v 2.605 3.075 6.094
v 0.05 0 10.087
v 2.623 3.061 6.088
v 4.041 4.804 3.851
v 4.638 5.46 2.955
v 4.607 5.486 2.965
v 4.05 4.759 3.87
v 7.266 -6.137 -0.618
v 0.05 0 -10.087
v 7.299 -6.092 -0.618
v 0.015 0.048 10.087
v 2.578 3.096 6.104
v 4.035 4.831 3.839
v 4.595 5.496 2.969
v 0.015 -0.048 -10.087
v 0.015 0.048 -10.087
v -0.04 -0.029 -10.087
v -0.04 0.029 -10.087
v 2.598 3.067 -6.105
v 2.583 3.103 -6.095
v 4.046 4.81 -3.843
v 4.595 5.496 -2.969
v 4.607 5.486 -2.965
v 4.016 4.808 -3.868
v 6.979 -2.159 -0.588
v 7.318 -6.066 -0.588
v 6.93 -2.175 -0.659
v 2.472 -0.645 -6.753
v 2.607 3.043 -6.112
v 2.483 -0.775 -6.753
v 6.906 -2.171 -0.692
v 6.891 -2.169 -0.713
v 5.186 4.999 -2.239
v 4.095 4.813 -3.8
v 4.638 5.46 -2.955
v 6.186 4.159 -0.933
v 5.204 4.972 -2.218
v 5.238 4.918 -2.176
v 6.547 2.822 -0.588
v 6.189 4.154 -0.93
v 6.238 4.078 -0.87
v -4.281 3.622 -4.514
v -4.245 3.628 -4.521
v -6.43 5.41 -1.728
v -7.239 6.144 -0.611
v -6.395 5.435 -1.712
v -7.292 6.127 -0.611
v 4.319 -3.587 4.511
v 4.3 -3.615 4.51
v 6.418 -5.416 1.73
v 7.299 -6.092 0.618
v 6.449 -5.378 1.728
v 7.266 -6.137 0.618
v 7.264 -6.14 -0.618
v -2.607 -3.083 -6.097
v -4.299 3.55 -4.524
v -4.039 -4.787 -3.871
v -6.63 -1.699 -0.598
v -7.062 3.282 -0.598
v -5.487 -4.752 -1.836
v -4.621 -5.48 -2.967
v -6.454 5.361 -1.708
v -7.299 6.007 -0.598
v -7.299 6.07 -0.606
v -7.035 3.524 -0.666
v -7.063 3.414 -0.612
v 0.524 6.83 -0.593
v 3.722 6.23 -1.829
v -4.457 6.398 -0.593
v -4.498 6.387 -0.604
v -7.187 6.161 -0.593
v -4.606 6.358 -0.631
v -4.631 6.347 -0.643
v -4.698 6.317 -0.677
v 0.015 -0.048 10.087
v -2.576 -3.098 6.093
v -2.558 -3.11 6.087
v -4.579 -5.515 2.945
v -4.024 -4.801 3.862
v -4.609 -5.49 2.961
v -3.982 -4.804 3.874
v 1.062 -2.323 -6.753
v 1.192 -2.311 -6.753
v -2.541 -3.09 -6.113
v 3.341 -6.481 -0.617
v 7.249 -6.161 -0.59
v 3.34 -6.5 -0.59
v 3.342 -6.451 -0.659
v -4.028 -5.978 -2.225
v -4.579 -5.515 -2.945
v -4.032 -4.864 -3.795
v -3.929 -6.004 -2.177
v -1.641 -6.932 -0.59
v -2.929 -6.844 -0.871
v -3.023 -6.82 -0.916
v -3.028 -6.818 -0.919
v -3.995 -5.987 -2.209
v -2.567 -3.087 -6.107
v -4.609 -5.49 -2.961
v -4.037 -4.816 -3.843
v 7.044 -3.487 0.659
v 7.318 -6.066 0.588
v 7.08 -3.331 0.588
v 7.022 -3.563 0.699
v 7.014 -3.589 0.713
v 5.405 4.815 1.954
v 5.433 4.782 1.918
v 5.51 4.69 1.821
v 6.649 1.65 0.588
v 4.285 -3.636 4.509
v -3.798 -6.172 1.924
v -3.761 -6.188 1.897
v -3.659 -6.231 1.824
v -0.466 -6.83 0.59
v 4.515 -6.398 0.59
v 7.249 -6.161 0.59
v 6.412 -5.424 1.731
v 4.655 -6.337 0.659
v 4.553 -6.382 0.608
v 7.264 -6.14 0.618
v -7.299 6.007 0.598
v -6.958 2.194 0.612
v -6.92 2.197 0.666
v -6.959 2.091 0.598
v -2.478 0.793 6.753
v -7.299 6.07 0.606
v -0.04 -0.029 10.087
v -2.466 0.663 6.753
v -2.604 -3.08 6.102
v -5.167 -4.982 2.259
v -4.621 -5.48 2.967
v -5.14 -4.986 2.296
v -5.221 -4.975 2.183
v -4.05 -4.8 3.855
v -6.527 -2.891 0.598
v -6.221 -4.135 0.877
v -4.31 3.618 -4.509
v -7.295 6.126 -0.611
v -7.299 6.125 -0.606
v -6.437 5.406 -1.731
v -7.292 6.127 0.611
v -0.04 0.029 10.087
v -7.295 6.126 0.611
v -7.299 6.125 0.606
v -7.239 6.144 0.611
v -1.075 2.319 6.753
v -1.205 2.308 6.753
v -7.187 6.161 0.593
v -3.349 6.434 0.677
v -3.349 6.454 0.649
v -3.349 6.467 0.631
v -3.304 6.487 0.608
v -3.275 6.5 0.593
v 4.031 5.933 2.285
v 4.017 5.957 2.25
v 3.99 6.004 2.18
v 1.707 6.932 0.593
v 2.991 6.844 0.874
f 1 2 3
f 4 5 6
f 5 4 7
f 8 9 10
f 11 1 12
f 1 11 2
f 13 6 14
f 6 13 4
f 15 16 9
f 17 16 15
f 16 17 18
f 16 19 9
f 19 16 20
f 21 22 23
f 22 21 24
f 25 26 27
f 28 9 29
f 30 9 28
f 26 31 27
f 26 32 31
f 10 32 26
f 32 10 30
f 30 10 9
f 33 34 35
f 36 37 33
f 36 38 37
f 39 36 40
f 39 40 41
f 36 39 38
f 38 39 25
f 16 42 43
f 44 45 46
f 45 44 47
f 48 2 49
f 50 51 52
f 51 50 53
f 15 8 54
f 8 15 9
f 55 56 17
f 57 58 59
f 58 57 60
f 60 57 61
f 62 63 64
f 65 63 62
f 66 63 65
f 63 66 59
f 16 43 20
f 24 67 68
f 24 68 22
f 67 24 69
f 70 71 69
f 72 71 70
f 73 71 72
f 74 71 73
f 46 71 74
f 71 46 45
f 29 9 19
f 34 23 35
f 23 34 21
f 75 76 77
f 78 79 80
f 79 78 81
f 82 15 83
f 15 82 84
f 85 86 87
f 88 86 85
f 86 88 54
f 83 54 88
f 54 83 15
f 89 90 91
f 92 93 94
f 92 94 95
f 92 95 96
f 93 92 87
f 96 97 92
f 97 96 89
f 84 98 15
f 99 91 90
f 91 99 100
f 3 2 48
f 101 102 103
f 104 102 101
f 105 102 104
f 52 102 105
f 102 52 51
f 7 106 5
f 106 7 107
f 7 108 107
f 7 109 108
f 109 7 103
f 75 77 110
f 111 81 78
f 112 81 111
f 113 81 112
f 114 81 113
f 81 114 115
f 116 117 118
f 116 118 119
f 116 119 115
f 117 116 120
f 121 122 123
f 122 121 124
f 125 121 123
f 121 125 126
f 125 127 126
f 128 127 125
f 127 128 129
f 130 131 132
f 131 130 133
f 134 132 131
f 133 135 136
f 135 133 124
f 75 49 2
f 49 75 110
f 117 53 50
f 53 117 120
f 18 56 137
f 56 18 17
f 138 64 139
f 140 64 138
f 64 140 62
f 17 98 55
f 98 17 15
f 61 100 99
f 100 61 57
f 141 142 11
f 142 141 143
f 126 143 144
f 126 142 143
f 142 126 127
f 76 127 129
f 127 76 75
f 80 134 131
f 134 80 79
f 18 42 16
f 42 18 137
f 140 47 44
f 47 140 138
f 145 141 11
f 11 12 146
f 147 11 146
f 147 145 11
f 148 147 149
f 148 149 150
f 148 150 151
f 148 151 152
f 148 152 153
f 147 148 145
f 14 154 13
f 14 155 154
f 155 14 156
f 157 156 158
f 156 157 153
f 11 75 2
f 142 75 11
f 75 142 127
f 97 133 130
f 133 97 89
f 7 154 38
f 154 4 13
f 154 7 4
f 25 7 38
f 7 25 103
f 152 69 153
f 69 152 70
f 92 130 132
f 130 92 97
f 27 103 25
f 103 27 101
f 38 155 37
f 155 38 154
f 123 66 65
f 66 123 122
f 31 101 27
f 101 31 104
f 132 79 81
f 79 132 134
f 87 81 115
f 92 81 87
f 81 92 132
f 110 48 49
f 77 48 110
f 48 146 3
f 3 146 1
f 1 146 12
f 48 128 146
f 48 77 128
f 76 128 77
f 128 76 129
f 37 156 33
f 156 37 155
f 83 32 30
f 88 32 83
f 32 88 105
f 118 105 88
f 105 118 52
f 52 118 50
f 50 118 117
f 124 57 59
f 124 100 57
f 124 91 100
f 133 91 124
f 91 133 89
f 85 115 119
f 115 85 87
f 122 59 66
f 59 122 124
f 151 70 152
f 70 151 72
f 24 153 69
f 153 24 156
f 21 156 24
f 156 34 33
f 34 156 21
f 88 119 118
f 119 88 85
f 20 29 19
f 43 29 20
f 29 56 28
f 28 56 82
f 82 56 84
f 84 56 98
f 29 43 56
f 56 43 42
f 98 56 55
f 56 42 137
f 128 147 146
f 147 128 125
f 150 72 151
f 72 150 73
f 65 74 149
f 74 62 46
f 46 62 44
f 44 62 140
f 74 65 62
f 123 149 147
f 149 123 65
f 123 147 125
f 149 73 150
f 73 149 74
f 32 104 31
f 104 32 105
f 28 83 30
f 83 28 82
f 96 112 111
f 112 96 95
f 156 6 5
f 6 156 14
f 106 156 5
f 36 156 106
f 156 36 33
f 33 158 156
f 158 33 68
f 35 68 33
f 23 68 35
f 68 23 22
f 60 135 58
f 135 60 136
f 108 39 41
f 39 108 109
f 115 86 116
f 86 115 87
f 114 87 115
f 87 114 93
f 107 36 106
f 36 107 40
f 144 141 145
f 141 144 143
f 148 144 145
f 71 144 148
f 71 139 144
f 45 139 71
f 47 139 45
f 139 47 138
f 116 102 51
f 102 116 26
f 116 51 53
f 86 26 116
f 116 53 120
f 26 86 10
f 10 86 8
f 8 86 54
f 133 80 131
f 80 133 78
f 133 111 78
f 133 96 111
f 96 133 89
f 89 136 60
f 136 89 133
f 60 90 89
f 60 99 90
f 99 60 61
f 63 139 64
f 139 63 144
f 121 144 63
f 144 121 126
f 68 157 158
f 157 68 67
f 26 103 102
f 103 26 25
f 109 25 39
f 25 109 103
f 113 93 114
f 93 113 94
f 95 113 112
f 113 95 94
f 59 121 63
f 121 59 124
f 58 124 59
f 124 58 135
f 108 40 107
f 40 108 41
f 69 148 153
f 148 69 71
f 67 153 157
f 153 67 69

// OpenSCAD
// Auto-generated OpenSCAD file

    shift = 0;

    inner_points = 10*[[-0.7217617826689717, 0.6065878485161154, -0.33333333333331405], [-0.6353813320543069, -0.3896743748726871, 0.6666666666666896], [-0.27450044071986923, -0.6929682991307544, -0.6666666666666534], [0.7217617826689717, -0.6065878485161154, 0.33333333333331405], [0.6353813320543069, 0.3896743748726871, -0.6666666666666896], [0.27450044071986923, 0.6929682991307544, 0.6666666666666534]];

    outer_points_unshifted = 10*[[-0.7655439763897738, 0.6433835716066518, 4.3410487328328886e-08], [-0.6433835716066508, -0.765543976389775, 3.648333112644759e-08], [-5.670541297058882e-08, 0.0, -0.9999999999999984], [0.7655439763897738, -0.6433835716066518, -4.3410487328328886e-08], [0.6433835716066508, 0.765543976389775, -3.648333112644759e-08], [5.670541297058882e-08, 0.0, 0.9999999999999984]];
    
    outer_points = [for (p = outer_points_unshifted) [p[0], p[1], p[2] + shift]];

    // Convex hull for inner set (I)
    module inner_hull() {
        hull() {
            for (p = inner_points) {
                translate(p) sphere(r=0.1);
            }
        }
    }

    // Convex hull for outer set (O) minus inner hull (O \ I)
    module outer_minus_inner() {
        difference() {
            hull() {
                for (p = outer_points) {
                    translate(p) sphere(r=0.1);
                }
            }
            inner_hull(); // Subtract inner hull
        }
    }

    // Convex hull for outer set (O) minus all translated inner hulls
    module outer_minus_AllTranslationInner() {
        difference() {
            hull() {
                for (p = outer_points) {
                    translate(p) sphere(r=0.1);
                }
            }
            hull() {
                translate([0,0,5]) inner_hull();
                translate([0,0,-5]) inner_hull();
            }; // Subtract translated inner hulls
        }
    }

    // Difference between outer_minus_inner and outer_minus_AllTranslationInner
    module outer_minus_inner_diff() {
        difference() {
            // Outer minus inner
            difference() {
                hull() {
                    for (p = outer_points) {
                        translate(p) sphere(r=0.1);
                    }
                }
                inner_hull();
            }

            // Subtract Outer minus AllTranslationInner
            difference() {
                hull() {
                    for (p = outer_points) {
                        translate(p) sphere(r=0.1);
                    }
                }
                hull() {
                    translate([0,0,5]) inner_hull();
                    translate([0,0,-5]) inner_hull();
                };
            }
        }
    }

    // Rendering all with colors applied
    // color([1, 0, 0, 0.5]) inner_hull(); // Transparent red
    // color([0, 1, 0, 1]) outer_minus_AllTranslationInner(); // Opaque green
    color([1, 1, 0, 1]) outer_minus_inner_diff(); // Opaque yellow
    
